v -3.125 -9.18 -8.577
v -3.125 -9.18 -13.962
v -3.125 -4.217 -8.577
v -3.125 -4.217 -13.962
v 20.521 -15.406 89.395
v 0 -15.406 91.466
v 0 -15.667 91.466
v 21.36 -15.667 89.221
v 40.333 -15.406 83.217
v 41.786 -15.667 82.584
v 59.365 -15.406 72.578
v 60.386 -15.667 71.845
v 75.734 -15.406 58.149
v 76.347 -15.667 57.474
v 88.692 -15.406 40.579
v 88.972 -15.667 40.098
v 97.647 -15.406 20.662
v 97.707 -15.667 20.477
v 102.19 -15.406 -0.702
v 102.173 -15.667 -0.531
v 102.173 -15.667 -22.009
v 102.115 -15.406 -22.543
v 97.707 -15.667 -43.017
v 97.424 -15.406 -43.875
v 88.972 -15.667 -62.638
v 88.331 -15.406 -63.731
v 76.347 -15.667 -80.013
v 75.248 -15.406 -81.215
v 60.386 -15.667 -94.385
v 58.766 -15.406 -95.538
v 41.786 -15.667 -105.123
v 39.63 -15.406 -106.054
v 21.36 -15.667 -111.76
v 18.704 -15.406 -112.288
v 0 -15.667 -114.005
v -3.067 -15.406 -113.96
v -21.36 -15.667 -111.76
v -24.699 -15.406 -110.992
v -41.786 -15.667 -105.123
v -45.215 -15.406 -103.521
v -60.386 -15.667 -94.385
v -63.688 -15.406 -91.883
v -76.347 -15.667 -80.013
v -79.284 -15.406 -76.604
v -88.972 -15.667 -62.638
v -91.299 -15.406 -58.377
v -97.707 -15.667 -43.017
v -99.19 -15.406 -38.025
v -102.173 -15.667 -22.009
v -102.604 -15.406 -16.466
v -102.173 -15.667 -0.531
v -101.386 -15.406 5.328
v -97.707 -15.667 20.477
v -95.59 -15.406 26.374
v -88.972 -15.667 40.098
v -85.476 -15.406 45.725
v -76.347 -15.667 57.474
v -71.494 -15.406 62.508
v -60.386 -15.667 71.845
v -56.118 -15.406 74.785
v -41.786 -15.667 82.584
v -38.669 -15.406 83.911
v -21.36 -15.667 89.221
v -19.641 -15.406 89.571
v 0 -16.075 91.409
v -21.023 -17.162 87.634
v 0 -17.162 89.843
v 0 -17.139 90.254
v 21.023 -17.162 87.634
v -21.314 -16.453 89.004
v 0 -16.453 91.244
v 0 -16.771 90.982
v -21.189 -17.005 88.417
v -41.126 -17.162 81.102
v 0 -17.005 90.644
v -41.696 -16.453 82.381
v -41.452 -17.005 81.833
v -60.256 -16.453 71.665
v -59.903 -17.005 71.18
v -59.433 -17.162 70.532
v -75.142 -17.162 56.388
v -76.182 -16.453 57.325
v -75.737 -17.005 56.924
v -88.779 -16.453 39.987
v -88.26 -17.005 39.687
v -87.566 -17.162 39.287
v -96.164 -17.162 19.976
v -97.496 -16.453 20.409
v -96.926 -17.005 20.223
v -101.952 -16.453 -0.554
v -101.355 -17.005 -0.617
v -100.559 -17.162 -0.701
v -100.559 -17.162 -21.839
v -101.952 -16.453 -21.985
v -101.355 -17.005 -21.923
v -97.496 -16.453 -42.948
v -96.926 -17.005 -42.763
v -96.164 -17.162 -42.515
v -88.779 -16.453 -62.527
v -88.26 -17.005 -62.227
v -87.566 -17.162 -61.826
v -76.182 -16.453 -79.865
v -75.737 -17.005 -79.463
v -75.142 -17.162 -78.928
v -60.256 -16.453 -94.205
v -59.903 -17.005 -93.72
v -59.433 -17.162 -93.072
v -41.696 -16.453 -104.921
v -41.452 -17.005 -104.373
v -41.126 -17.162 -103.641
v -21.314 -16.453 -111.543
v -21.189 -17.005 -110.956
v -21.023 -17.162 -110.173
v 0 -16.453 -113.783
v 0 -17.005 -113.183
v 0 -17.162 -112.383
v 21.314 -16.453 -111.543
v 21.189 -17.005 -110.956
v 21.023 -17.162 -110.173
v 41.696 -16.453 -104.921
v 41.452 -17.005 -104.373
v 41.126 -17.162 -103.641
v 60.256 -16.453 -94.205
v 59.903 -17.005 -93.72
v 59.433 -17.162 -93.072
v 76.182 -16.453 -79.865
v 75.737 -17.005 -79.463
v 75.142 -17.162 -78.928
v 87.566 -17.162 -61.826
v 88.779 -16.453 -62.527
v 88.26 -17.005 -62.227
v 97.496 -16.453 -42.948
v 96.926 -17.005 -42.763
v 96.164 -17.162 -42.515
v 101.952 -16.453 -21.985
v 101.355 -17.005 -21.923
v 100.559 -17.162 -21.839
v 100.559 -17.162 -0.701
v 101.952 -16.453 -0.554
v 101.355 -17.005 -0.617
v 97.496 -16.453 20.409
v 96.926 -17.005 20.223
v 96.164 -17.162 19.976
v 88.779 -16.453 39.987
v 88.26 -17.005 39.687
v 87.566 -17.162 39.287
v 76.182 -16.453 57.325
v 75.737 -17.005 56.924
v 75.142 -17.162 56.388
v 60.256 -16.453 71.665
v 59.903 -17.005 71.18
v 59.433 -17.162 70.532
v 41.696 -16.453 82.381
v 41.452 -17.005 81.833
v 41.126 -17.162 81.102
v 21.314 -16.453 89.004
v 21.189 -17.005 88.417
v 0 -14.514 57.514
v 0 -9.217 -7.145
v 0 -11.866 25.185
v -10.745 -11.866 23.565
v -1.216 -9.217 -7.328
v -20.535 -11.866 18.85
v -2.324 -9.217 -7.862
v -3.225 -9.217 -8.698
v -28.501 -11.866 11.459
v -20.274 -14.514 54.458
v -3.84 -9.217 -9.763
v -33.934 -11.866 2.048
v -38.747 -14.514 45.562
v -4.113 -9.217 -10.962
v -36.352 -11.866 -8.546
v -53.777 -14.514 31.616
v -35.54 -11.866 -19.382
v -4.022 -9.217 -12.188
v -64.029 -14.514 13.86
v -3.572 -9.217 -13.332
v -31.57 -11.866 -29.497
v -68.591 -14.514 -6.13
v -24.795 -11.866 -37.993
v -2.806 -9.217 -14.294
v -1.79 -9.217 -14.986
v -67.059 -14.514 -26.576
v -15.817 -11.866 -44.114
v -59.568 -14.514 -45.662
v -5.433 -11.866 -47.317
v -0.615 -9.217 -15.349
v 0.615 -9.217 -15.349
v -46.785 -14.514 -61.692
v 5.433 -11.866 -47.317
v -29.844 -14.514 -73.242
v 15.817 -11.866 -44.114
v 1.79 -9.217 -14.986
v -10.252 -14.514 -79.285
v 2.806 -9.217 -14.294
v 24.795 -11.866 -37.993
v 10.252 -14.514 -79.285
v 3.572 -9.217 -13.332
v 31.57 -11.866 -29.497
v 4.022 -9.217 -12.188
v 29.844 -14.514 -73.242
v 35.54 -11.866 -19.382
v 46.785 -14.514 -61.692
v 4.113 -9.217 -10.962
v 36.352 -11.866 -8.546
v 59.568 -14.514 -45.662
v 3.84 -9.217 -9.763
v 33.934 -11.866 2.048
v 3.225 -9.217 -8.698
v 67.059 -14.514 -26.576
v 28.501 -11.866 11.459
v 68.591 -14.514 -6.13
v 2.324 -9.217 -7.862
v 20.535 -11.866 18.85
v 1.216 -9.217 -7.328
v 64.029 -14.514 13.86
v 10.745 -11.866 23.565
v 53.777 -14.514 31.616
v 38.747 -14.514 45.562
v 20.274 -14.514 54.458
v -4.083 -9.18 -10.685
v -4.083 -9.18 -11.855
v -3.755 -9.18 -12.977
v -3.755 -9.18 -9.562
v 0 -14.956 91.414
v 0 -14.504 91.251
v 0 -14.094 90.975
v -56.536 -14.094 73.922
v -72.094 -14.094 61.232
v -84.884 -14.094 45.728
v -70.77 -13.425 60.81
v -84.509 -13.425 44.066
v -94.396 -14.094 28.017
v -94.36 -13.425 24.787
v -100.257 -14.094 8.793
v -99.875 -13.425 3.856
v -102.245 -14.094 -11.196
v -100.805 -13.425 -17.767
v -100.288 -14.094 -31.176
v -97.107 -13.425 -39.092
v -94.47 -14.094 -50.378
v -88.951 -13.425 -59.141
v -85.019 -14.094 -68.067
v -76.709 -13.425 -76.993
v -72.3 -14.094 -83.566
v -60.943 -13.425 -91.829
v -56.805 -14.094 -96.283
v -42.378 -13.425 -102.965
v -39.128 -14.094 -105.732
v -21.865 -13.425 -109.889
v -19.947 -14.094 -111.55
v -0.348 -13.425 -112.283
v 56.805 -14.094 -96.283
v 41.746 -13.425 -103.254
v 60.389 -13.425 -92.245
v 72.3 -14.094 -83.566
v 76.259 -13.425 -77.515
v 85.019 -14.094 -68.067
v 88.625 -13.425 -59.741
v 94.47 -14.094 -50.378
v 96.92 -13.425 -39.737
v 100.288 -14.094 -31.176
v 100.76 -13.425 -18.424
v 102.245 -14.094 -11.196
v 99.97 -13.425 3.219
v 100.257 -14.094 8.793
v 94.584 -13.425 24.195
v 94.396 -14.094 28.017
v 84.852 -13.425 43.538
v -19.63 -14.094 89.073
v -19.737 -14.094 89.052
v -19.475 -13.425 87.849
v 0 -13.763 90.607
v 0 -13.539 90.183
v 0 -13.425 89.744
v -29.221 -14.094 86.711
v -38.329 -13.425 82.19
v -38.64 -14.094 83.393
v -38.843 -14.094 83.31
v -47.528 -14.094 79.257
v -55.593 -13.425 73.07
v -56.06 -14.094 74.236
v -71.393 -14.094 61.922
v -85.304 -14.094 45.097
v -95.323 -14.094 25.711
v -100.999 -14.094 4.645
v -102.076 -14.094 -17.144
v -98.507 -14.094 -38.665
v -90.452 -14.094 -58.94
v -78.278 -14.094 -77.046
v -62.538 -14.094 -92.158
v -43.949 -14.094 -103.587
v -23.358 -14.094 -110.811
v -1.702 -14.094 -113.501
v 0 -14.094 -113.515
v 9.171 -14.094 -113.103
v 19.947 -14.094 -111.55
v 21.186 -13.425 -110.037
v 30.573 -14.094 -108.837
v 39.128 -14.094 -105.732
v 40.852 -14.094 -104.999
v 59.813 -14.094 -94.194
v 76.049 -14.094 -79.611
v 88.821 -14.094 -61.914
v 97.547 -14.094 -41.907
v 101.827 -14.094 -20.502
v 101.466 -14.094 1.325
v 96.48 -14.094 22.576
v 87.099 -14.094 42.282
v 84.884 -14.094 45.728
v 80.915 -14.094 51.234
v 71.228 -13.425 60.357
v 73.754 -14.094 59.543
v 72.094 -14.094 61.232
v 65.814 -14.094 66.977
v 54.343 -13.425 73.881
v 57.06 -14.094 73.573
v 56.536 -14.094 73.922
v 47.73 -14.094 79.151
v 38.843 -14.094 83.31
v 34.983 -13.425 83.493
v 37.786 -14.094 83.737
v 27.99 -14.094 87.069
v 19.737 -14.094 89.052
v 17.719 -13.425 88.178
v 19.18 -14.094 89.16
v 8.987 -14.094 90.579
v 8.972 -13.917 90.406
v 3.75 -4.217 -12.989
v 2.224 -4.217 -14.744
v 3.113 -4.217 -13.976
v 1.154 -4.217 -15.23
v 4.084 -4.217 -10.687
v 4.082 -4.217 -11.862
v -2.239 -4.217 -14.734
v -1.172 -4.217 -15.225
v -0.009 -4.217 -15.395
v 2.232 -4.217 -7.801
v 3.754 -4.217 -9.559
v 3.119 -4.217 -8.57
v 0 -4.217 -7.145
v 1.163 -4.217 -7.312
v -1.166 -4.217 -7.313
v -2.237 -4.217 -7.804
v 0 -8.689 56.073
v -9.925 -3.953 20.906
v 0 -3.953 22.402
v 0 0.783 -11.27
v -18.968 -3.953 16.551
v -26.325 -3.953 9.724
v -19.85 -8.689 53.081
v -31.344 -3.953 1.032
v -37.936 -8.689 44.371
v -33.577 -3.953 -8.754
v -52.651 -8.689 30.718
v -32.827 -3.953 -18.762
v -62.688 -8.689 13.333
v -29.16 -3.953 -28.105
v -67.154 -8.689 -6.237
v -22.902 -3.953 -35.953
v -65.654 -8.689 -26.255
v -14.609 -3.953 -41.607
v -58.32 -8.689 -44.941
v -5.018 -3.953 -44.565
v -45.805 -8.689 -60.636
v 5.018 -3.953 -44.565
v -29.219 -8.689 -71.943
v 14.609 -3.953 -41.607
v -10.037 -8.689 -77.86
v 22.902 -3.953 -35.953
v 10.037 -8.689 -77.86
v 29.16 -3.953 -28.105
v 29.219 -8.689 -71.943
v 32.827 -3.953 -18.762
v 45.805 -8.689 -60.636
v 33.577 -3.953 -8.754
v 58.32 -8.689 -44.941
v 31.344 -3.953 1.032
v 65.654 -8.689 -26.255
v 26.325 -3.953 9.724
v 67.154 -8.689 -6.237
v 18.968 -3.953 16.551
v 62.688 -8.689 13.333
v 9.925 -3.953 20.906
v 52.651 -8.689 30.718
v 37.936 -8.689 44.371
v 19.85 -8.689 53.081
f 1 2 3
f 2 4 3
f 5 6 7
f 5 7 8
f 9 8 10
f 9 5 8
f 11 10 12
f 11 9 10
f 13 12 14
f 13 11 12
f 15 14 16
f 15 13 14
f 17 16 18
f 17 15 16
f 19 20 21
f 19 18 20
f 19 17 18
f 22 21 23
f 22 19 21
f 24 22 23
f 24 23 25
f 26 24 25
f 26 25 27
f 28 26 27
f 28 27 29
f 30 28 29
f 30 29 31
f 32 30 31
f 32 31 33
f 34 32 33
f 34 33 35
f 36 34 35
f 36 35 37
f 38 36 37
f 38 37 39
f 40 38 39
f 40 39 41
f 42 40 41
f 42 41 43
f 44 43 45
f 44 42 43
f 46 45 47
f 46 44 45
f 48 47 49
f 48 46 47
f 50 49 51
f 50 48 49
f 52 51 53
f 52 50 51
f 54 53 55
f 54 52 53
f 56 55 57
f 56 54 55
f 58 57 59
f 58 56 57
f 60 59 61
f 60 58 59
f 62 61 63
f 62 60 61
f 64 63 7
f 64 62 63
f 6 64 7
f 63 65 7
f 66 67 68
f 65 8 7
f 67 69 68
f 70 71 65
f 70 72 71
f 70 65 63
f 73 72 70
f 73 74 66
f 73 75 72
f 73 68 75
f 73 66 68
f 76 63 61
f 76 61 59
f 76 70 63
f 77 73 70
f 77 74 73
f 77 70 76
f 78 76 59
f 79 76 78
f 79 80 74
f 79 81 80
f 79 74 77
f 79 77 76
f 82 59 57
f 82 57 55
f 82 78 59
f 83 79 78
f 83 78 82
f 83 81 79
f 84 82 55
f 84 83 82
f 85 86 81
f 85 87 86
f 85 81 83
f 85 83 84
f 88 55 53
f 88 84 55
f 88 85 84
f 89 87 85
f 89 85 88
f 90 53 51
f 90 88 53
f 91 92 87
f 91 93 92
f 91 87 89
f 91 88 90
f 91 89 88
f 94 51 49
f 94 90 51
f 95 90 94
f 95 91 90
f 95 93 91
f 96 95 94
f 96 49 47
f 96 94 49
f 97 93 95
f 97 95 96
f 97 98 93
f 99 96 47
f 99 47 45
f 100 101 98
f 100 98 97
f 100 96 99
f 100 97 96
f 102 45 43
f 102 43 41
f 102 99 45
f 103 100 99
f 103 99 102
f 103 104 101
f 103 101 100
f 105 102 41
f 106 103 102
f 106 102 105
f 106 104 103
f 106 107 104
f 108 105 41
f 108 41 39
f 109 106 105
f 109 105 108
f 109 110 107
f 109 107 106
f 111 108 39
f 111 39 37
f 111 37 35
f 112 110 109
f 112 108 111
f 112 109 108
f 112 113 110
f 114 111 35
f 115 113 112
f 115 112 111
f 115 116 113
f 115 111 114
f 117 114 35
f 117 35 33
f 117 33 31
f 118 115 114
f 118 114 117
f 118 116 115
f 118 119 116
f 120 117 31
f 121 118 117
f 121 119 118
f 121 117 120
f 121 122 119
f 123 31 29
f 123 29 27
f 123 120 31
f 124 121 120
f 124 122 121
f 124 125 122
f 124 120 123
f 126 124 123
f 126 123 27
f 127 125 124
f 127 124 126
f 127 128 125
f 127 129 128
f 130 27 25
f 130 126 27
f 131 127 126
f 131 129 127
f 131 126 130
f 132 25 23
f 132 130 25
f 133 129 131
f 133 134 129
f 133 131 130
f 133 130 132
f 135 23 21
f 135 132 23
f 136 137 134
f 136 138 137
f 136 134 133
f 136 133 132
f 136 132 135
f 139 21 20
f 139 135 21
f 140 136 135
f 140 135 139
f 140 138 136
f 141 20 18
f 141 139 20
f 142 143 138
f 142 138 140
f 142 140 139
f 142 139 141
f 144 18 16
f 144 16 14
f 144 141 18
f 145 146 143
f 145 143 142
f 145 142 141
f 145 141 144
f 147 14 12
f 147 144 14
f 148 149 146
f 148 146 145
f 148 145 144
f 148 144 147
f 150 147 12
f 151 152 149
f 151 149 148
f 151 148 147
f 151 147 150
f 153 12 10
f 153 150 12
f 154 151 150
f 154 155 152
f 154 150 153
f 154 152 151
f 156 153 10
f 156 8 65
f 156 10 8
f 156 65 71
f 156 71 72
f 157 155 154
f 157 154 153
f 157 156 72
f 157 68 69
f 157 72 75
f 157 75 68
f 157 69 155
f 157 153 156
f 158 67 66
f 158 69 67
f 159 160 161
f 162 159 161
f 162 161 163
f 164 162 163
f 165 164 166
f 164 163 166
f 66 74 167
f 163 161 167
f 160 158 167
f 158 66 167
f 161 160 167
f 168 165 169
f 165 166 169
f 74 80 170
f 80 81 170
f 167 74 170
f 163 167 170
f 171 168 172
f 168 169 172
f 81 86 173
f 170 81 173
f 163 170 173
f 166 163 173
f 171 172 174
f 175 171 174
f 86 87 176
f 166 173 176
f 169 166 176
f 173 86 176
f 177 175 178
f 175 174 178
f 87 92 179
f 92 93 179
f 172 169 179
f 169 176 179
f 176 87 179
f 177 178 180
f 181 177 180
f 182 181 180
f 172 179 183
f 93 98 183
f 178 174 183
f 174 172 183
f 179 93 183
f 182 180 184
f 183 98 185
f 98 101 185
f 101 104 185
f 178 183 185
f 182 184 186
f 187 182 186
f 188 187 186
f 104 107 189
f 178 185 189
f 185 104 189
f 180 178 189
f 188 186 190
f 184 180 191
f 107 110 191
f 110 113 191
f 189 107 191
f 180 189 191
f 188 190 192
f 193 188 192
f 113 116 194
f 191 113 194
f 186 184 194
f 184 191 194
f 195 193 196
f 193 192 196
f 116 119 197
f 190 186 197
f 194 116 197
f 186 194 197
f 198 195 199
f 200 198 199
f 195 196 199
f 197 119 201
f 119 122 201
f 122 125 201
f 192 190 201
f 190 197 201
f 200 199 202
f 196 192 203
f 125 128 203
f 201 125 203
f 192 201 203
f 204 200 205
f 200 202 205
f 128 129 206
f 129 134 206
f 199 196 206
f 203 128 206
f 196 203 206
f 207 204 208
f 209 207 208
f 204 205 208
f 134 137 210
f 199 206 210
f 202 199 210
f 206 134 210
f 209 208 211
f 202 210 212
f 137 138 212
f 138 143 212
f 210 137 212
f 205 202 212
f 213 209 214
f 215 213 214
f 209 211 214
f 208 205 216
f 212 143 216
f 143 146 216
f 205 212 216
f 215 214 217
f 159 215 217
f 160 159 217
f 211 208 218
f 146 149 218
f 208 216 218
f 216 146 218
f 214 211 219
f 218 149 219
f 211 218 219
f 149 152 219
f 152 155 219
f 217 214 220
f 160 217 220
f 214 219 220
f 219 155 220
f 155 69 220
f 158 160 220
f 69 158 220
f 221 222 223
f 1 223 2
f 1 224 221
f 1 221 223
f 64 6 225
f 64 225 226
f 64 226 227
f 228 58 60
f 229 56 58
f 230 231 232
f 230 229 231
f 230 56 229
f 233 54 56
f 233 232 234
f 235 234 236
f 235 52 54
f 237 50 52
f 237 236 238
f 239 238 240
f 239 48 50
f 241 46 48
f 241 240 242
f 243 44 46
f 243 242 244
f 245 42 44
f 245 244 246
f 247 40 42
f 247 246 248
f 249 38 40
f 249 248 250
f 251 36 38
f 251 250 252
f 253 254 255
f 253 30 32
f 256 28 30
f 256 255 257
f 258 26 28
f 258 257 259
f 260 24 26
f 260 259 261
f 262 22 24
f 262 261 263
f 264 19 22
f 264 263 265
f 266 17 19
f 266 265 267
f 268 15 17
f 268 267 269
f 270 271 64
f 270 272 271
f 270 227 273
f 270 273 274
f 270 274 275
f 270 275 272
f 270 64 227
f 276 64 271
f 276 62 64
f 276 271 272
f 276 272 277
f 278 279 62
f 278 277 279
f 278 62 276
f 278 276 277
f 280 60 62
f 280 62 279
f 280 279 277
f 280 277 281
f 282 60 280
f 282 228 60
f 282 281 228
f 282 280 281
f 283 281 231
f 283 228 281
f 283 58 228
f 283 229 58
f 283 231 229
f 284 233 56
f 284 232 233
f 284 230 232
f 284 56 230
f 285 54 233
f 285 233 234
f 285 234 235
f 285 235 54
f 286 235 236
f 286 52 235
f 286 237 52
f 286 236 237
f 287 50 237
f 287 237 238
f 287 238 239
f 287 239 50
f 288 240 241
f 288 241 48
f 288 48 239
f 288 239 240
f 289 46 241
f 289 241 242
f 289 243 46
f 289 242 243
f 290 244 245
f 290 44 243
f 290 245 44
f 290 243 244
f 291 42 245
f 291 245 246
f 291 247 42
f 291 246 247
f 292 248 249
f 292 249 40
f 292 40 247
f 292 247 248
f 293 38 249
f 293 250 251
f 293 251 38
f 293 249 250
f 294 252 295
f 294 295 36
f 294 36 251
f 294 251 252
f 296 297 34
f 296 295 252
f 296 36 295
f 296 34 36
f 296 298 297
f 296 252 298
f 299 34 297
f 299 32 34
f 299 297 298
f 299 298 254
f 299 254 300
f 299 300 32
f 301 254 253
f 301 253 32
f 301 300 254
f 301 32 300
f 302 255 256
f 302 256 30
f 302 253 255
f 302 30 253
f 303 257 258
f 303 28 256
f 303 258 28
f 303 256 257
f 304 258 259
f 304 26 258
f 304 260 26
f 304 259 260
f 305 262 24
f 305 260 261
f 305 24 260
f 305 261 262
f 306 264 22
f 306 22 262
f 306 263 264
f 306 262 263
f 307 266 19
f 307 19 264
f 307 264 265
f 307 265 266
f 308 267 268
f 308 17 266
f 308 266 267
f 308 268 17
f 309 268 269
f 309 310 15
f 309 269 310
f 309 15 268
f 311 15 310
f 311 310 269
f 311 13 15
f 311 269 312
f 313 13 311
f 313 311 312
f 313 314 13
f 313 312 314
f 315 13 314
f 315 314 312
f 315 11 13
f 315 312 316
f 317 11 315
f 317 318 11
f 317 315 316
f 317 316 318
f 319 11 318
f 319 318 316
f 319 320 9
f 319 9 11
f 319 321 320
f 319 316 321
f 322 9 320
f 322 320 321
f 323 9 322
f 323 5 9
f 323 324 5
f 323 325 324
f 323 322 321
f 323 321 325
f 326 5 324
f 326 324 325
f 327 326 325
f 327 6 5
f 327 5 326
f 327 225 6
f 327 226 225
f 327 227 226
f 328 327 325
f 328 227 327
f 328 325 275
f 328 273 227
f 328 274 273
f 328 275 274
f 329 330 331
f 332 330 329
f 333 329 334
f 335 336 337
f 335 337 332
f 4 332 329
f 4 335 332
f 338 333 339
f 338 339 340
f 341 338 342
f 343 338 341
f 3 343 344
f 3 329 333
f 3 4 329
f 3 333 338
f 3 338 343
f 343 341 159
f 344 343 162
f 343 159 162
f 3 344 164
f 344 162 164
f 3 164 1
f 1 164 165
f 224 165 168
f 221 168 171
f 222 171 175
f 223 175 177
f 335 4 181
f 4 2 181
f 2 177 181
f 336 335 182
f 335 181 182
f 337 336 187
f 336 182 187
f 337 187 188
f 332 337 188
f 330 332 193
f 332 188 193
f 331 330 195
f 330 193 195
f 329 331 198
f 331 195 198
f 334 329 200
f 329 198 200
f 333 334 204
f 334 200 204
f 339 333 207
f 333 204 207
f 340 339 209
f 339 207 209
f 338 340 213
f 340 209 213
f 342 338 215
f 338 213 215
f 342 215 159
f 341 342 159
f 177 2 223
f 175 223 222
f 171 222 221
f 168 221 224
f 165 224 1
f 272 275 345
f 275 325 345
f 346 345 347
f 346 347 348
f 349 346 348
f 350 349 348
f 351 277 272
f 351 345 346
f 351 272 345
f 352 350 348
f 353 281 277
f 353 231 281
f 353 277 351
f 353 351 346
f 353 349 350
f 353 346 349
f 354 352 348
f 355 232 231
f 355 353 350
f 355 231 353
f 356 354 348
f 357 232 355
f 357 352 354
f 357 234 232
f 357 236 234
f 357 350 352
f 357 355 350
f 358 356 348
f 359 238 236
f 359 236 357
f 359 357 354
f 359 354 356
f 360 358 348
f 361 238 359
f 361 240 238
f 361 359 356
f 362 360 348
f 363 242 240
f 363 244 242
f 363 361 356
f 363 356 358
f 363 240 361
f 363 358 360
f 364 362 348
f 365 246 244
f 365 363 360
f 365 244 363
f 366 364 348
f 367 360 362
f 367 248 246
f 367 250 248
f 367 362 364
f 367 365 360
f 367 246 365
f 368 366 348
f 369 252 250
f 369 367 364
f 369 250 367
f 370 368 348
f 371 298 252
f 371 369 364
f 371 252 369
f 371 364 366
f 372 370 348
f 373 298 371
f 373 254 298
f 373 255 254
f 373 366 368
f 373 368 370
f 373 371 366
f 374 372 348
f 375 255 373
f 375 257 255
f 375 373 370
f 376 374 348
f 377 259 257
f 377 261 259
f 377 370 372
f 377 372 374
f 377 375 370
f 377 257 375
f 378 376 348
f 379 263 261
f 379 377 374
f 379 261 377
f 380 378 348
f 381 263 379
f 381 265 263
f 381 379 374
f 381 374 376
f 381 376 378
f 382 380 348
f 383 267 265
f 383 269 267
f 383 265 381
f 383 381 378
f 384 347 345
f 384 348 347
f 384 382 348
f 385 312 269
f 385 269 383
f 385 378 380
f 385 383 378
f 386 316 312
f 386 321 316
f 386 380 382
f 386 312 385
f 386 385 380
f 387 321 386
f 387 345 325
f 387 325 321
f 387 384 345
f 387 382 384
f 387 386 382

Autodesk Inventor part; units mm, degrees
ref_plane "YZ Plane" through (0, 0, 0) normal (1, 0, 0) x (0, 1, 0)
ref_plane "XZ Plane" through (0, 0, 0) normal (0, 1, 0) x (-1, 0, 0)
ref_plane "XY Plane" through (0, 0, 0) normal (0, 0, 1) x (1, 0, 0)
sketch "Sketch1" plane through (0, 0, 0) normal (1, 0, 0) x (0, 1, 0)
  line L0 (-17.6674, 93.5386) -> (-20.6674, 93.5386)
  line L1 (-20.6674, 86.1116) -> (-20.6674, 93.5386)
  line L2 (-17.6674, 86.1116) -> (-20.6674, 86.1116)
  line L3 (-17.6674, 89.9657) -> (-17.6674, 86.1116)
  arc A0 (-15.6674, 91.9657) -> (-17.6674, 89.9657) centre (-15.6674, 89.9657) ccw
  line L4 (-13.6674, 91.9657) -> (-15.6674, 91.9657)
  line L5 (-13.6674, 121.9657) -> (-13.6674, 91.9657)
  line L6 (-20.6674, 121.9657) -> (-13.6674, 121.9657)
  line L7 (-20.6674, 111.9657) -> (-20.6674, 121.9657)
  line L8 (-15.6674, 111.9657) -> (-20.6674, 111.9657)
  line L9 (-15.6674, 101.9657) -> (-15.6674, 111.9657)
  line L10 (-20.6674, 101.9657) -> (-15.6674, 101.9657)
  line L11 (-20.6674, 98.5386) -> (-20.6674, 101.9657)
  line L12 (-20.6674, 98.5386) -> (-17.6674, 98.5386)
  line L13 (-17.6674, 98.5386) -> (-17.6674, 93.5386)
  line L14 (-4.2174, -15.1948) -> (-4.2174, -7.3448)
  line L15 (-4.2174, -7.3448) -> (0.2305, -7.3448)
  circle A1 centre (-15.6674, 89.9657) radius 1.5
  line L16 (-15.6674, 91.4657) -> (-13.6674, 91.4657)
  line L17 (0.7826, -11.2698) -> (-4.2174, -11.2698)
  line L18 (0.7826, -11.2698) -> (-13.6674, 91.4657)
  line L19 (-4.2174, -7.3448) -> (-4.2174, -7.1448)
  line L20 (-4.2174, -7.1448) -> (-9.2174, -7.1448)
  line L21 (-9.2174, -7.1448) -> (-17.1624, 89.8432)
  point P0 (0, 0)
  dimension "d1" = 3
  dimension "d2" = 0.2
  dimension "d3" = 5
revolve "Revolution1" add sketch "Sketch1" angle 360 about axis through (0, 0.7826, -11.2698) along (0, -1, 0) contours L14 L15 L18 L17 | L19 L20 L21 A1 L16 L18 L15 | A1
sketch "Sketch2" plane through (0, -4.2174, -11.2698) normal (0, -1, 0) x (1, 0, 0)
  circle A0 centre (0, 0) radius 4.125 projected
  line L0 (-4.125, 0) -> (-3.125, 0)
  line L1 (-3.125, 0) -> (-3.125, -2.6926)
  line L2 (-3.125, 0) -> (-3.125, 2.6926)
  point P0 (0, 11.2698)
  dimension "d5" = 1
extrude "Extrusion1" add sketch "Sketch2" along normal blind 4.963 contours L2 L0 A0 | A0 L0 L1
fillet "Fillet1" radius 2 1 edges at (0, -13.6674, -114.0053)
properties part number "TopSpinner_steep_angle_V2"
